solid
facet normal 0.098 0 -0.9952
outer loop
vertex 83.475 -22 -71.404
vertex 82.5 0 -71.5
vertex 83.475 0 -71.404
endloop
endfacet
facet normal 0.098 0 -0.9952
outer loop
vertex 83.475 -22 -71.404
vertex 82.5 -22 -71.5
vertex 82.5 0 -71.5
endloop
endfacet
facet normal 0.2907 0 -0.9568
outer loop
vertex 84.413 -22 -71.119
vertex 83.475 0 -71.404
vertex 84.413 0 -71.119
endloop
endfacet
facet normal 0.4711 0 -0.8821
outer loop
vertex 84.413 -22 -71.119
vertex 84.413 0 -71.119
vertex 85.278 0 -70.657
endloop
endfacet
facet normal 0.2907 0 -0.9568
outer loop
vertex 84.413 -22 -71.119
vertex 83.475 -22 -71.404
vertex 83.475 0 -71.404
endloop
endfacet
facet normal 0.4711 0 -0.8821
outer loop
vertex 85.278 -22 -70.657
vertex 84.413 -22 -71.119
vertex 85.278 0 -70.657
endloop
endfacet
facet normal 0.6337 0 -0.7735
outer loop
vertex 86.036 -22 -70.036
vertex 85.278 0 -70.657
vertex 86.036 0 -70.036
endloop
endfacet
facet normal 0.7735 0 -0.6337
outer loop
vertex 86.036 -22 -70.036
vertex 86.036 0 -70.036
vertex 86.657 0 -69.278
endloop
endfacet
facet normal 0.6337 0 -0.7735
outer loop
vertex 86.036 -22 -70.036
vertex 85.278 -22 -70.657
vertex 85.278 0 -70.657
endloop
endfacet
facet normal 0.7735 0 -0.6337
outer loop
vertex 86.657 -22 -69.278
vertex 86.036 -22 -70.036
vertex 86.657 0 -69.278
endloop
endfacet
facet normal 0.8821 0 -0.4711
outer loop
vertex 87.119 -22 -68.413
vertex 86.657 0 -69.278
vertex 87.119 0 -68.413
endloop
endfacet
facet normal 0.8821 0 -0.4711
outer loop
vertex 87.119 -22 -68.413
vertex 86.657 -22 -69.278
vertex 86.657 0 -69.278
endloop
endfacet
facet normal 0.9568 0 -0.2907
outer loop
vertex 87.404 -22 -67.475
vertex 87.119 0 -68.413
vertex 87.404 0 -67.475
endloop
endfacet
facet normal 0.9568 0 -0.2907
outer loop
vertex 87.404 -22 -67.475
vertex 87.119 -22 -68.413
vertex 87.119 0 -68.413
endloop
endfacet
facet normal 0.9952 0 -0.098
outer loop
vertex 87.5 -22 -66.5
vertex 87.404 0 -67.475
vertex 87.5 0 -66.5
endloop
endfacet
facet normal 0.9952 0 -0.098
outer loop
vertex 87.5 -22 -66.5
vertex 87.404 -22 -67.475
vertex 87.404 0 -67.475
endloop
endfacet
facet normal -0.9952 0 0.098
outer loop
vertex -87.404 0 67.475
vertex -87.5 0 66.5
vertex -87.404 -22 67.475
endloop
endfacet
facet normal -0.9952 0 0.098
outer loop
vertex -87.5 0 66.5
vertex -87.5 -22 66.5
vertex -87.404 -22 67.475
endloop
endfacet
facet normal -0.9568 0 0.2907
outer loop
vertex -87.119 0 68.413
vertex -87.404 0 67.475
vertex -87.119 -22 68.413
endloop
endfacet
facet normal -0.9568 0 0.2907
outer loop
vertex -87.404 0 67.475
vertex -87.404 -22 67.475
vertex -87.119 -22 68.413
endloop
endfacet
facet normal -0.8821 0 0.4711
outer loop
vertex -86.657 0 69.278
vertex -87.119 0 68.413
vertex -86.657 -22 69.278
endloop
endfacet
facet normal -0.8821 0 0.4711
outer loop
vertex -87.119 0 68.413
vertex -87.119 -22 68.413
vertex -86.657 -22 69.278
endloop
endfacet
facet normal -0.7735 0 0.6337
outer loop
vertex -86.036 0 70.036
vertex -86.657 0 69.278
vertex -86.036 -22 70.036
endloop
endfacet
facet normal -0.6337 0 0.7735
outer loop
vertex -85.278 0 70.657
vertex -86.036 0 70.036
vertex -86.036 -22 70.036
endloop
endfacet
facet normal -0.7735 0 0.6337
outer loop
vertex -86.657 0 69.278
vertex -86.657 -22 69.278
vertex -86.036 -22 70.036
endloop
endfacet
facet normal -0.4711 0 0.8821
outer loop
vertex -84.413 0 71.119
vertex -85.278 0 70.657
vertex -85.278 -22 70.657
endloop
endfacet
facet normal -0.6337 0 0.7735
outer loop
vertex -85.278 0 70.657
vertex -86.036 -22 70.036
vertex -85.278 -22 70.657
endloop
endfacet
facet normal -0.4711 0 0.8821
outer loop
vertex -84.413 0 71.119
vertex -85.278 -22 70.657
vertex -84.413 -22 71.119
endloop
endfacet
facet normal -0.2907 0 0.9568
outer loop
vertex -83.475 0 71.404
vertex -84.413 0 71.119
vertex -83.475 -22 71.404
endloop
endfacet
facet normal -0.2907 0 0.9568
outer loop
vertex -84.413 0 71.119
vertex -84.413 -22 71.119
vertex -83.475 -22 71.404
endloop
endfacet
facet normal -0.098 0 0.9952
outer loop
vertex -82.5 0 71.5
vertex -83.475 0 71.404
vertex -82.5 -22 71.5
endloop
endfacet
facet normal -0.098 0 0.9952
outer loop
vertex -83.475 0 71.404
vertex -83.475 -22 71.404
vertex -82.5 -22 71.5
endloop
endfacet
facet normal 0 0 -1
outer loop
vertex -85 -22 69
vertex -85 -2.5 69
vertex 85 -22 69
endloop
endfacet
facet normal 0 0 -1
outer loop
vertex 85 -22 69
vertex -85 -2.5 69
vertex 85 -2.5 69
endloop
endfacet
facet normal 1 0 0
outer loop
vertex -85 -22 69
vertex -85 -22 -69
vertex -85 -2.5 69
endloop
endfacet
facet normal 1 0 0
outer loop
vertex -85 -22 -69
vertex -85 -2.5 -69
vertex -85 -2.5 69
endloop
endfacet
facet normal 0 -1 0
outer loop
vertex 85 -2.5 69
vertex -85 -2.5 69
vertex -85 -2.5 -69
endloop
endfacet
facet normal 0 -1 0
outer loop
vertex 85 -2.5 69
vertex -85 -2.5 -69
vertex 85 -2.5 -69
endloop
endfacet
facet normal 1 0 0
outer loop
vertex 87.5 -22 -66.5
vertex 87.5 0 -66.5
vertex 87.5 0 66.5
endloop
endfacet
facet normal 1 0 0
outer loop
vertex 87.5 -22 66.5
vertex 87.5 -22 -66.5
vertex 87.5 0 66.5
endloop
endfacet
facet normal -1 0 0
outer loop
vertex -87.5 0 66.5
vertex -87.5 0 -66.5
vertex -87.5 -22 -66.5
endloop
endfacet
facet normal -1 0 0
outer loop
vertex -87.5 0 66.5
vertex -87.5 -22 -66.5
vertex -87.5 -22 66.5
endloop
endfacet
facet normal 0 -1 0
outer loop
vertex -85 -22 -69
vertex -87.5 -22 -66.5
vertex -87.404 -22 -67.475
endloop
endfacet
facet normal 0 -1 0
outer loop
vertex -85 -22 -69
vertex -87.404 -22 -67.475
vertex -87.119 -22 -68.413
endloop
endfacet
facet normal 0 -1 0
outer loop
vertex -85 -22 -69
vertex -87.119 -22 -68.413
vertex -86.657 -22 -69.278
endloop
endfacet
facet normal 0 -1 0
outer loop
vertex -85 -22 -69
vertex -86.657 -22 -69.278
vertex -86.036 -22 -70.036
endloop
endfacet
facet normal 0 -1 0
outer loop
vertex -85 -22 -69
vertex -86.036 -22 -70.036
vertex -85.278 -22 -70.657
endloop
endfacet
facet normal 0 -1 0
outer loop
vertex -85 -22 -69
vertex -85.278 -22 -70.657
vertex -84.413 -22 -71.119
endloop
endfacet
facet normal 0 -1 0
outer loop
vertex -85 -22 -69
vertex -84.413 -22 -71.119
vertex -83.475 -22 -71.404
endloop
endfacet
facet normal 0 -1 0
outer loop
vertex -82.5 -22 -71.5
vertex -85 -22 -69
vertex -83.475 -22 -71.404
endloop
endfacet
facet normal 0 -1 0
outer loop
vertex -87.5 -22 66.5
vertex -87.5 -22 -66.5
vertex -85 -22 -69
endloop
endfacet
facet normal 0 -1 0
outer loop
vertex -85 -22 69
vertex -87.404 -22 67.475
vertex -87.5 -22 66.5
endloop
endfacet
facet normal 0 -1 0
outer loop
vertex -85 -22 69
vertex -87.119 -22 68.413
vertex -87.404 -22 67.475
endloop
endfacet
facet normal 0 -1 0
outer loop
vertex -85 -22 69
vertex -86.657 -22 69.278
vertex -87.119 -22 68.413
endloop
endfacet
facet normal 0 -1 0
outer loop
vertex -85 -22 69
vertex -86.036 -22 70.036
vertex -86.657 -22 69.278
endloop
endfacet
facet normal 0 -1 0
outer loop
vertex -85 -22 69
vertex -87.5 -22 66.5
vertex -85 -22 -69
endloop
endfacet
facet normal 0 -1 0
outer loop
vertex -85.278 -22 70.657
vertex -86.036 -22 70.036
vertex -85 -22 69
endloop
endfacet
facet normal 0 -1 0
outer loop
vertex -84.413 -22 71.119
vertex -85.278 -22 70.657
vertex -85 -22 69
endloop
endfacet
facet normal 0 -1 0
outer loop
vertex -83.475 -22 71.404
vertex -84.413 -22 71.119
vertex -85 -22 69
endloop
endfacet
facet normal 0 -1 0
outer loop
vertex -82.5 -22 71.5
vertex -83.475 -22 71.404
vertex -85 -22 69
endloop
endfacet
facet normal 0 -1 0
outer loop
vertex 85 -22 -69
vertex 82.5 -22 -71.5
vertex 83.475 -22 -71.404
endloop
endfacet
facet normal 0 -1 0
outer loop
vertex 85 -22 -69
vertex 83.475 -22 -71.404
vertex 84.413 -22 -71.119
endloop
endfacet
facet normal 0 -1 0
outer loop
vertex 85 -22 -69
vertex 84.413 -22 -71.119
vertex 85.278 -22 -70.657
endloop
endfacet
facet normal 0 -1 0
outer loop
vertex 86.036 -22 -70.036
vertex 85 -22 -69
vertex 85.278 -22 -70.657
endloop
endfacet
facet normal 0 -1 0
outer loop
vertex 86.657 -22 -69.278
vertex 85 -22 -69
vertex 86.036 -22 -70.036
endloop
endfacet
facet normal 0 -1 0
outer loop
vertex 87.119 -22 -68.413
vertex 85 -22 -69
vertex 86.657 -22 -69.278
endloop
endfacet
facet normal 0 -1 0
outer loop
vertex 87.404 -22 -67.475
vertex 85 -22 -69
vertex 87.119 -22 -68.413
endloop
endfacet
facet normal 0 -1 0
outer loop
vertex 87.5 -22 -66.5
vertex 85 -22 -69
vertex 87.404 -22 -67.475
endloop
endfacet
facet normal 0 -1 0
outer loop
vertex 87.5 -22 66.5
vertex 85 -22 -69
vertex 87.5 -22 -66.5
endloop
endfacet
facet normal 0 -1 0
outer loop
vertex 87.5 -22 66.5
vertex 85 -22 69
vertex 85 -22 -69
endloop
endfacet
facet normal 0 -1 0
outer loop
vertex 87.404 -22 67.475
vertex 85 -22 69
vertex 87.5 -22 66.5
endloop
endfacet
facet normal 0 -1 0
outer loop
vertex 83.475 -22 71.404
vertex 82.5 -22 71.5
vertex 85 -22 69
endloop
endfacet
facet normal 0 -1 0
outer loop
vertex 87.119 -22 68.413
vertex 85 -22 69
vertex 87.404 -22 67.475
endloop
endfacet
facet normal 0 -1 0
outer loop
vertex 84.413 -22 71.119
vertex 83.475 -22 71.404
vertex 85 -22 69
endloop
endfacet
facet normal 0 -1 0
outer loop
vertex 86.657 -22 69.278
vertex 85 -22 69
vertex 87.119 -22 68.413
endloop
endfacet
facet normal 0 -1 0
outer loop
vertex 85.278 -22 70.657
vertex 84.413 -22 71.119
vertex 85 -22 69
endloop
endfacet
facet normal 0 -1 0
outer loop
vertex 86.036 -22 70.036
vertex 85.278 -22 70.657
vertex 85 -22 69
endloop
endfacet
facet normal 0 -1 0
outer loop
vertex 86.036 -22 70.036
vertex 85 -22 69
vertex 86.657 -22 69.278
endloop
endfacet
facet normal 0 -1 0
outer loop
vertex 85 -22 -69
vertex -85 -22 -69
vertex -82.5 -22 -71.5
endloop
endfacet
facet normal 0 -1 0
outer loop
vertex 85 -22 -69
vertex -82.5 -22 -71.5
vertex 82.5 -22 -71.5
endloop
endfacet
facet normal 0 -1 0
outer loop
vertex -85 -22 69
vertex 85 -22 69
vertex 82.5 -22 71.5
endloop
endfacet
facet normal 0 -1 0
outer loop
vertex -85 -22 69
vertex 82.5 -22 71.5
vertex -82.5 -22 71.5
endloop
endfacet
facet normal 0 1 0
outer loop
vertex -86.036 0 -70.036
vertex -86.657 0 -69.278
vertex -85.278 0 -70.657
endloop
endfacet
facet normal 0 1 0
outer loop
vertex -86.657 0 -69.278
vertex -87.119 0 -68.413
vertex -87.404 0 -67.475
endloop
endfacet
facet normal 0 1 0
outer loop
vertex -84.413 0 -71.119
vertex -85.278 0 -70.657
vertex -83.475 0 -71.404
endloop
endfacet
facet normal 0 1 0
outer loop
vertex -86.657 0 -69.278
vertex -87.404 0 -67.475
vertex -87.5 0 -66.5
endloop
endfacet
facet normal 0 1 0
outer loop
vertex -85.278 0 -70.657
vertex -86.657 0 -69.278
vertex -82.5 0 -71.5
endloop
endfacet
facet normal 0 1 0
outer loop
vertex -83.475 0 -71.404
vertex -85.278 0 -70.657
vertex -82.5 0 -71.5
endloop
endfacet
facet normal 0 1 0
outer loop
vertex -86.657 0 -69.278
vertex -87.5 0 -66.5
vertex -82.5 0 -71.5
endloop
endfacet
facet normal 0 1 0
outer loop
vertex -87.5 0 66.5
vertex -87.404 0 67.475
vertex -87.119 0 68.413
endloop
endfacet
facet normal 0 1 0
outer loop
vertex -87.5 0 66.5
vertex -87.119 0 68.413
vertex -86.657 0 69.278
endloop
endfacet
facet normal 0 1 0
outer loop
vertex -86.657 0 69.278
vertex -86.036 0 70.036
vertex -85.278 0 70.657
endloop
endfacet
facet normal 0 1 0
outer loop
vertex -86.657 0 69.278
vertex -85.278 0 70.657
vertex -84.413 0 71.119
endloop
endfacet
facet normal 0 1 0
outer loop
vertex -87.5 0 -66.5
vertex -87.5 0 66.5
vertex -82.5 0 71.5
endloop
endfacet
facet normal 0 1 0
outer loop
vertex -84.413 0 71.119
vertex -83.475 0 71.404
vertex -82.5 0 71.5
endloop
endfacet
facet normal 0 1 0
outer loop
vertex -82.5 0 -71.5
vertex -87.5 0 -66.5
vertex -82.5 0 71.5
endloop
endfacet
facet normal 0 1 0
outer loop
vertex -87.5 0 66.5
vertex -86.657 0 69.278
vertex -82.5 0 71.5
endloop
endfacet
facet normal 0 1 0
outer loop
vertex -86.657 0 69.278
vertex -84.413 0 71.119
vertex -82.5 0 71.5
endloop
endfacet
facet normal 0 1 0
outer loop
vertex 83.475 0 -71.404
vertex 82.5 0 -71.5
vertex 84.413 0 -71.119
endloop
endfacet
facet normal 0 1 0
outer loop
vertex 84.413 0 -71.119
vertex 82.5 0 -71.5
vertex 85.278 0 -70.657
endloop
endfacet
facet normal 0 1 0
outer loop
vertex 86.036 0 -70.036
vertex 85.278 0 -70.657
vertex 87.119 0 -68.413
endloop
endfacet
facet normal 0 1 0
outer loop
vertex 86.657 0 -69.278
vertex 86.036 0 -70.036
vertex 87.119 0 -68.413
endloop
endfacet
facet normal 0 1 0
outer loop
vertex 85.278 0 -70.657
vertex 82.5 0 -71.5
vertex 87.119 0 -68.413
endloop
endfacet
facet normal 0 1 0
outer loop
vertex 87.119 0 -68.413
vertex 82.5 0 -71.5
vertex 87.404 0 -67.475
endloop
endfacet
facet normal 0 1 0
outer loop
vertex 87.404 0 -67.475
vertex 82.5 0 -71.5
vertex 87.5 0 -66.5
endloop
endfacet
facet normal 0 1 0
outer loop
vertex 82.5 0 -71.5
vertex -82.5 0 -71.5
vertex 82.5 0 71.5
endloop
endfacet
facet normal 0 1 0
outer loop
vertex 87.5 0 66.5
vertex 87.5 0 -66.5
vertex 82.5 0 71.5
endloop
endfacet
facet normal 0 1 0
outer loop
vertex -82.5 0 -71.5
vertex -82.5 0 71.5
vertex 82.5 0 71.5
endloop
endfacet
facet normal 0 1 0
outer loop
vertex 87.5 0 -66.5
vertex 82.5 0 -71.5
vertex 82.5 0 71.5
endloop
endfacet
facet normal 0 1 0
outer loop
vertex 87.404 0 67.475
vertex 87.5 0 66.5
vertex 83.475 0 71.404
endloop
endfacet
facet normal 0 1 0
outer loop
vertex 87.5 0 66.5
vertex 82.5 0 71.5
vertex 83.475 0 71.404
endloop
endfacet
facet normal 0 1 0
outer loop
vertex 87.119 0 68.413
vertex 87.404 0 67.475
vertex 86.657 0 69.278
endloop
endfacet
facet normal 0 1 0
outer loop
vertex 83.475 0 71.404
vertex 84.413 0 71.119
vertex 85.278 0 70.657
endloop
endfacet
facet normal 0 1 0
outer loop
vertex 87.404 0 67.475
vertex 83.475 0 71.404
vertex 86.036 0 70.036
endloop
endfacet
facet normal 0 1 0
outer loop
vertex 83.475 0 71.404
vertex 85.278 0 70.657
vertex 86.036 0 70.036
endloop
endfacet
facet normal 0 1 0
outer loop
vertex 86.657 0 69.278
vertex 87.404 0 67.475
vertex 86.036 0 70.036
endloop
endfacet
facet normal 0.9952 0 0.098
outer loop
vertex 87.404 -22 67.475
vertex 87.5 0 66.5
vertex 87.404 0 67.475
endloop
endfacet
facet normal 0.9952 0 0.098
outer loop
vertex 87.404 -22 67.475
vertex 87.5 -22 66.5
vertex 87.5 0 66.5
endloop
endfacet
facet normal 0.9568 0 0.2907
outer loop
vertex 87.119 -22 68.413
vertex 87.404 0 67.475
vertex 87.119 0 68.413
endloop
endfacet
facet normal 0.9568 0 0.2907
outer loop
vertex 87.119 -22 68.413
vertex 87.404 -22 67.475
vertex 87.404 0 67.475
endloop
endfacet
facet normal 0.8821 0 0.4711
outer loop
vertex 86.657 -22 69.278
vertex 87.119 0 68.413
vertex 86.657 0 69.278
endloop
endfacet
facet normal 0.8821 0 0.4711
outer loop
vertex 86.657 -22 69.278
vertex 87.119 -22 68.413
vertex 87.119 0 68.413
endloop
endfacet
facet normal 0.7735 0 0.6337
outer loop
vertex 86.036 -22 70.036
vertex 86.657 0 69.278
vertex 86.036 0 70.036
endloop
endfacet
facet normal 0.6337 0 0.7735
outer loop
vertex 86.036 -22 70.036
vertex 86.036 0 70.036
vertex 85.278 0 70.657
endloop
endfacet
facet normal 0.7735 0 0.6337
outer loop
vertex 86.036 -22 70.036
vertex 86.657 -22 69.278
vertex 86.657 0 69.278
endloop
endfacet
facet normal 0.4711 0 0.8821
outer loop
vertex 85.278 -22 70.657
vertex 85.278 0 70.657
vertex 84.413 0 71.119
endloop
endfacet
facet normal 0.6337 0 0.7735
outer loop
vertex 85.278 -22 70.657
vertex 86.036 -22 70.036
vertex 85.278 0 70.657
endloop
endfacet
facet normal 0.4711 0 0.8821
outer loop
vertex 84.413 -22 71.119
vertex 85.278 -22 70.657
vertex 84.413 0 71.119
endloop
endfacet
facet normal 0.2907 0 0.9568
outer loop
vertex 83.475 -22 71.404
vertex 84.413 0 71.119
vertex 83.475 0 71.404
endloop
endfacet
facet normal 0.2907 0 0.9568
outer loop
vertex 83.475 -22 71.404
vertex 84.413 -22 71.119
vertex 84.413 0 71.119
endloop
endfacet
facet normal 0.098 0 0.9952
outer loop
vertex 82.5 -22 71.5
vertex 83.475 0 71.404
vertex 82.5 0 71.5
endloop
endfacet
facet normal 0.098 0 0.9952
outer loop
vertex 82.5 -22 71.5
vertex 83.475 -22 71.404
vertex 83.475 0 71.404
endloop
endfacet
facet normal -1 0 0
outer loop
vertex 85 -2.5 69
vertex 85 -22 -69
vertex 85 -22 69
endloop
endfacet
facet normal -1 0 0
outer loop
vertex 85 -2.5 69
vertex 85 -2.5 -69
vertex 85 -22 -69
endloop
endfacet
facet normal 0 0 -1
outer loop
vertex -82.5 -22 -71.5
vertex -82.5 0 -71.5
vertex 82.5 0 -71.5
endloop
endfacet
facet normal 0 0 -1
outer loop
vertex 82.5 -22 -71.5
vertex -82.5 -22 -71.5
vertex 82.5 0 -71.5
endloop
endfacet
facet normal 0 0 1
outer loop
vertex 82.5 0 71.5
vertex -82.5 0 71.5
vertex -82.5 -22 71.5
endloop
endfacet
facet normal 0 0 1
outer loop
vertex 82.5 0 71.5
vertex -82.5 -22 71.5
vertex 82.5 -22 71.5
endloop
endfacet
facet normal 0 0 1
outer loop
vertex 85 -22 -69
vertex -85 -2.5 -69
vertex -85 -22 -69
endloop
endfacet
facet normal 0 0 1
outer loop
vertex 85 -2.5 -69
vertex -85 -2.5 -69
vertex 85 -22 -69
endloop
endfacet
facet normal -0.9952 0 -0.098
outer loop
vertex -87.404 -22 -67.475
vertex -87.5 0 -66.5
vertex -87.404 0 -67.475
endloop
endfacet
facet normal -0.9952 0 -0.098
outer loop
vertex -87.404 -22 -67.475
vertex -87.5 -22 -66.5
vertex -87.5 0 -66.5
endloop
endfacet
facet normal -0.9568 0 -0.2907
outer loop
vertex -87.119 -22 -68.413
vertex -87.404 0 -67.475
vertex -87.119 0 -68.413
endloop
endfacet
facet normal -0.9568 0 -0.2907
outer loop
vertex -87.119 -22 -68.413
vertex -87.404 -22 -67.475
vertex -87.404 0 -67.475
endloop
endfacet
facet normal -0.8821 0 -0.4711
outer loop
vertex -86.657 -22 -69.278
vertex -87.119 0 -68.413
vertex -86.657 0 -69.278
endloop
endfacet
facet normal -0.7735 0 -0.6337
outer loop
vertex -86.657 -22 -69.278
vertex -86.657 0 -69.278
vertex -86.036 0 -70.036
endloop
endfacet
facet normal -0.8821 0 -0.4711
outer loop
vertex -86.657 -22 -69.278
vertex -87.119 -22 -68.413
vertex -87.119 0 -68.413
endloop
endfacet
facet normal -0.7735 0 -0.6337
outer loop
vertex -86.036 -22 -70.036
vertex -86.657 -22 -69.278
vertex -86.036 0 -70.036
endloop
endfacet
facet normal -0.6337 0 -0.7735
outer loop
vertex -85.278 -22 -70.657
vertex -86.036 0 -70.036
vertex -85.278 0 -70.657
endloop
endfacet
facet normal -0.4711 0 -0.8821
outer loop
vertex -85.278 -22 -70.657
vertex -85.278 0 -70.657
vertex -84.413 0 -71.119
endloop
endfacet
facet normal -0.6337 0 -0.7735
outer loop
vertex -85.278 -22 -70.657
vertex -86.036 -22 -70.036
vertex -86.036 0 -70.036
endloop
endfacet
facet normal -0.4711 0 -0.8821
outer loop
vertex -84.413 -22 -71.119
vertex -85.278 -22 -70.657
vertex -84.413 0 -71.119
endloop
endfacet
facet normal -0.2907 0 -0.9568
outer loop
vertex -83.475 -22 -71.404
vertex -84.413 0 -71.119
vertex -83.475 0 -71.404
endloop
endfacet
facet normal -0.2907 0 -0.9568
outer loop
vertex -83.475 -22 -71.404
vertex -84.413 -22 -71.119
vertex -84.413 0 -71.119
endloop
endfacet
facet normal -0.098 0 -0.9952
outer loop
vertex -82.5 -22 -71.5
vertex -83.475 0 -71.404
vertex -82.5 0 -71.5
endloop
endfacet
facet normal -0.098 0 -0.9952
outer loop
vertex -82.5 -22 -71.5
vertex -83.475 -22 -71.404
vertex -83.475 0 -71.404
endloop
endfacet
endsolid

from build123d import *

# Parameters (mm, degrees)
F0_W     = 175
F0_H     = 143
F1_DEPTH = 22
F2_T     = -2.5
F3_R     = 5


with BuildPart() as f1:
    # F0 (on Front) → F1 (new body)
    with BuildSketch(Plane.XZ):
        Rectangle(F0_W, F0_H)
    extrude(amount=F1_DEPTH)

    # F2
    f2_openings = [f1.faces().sort_by_distance(p)[0] for p in [
        (0, -22, 0),
    ]]
    offset(amount=F2_T, openings=f2_openings)

    # F3
    f3_edges = [f1.edges().sort_by_distance(p)[0] for p in [
        (-87.5, -11, 71.5),
        (-87.5, -11, -71.5),
        (87.5, -11, 71.5),
        (87.5, -11, -71.5),
    ]]
    fillet(f3_edges, radius=F3_R)


solid = f1.part
